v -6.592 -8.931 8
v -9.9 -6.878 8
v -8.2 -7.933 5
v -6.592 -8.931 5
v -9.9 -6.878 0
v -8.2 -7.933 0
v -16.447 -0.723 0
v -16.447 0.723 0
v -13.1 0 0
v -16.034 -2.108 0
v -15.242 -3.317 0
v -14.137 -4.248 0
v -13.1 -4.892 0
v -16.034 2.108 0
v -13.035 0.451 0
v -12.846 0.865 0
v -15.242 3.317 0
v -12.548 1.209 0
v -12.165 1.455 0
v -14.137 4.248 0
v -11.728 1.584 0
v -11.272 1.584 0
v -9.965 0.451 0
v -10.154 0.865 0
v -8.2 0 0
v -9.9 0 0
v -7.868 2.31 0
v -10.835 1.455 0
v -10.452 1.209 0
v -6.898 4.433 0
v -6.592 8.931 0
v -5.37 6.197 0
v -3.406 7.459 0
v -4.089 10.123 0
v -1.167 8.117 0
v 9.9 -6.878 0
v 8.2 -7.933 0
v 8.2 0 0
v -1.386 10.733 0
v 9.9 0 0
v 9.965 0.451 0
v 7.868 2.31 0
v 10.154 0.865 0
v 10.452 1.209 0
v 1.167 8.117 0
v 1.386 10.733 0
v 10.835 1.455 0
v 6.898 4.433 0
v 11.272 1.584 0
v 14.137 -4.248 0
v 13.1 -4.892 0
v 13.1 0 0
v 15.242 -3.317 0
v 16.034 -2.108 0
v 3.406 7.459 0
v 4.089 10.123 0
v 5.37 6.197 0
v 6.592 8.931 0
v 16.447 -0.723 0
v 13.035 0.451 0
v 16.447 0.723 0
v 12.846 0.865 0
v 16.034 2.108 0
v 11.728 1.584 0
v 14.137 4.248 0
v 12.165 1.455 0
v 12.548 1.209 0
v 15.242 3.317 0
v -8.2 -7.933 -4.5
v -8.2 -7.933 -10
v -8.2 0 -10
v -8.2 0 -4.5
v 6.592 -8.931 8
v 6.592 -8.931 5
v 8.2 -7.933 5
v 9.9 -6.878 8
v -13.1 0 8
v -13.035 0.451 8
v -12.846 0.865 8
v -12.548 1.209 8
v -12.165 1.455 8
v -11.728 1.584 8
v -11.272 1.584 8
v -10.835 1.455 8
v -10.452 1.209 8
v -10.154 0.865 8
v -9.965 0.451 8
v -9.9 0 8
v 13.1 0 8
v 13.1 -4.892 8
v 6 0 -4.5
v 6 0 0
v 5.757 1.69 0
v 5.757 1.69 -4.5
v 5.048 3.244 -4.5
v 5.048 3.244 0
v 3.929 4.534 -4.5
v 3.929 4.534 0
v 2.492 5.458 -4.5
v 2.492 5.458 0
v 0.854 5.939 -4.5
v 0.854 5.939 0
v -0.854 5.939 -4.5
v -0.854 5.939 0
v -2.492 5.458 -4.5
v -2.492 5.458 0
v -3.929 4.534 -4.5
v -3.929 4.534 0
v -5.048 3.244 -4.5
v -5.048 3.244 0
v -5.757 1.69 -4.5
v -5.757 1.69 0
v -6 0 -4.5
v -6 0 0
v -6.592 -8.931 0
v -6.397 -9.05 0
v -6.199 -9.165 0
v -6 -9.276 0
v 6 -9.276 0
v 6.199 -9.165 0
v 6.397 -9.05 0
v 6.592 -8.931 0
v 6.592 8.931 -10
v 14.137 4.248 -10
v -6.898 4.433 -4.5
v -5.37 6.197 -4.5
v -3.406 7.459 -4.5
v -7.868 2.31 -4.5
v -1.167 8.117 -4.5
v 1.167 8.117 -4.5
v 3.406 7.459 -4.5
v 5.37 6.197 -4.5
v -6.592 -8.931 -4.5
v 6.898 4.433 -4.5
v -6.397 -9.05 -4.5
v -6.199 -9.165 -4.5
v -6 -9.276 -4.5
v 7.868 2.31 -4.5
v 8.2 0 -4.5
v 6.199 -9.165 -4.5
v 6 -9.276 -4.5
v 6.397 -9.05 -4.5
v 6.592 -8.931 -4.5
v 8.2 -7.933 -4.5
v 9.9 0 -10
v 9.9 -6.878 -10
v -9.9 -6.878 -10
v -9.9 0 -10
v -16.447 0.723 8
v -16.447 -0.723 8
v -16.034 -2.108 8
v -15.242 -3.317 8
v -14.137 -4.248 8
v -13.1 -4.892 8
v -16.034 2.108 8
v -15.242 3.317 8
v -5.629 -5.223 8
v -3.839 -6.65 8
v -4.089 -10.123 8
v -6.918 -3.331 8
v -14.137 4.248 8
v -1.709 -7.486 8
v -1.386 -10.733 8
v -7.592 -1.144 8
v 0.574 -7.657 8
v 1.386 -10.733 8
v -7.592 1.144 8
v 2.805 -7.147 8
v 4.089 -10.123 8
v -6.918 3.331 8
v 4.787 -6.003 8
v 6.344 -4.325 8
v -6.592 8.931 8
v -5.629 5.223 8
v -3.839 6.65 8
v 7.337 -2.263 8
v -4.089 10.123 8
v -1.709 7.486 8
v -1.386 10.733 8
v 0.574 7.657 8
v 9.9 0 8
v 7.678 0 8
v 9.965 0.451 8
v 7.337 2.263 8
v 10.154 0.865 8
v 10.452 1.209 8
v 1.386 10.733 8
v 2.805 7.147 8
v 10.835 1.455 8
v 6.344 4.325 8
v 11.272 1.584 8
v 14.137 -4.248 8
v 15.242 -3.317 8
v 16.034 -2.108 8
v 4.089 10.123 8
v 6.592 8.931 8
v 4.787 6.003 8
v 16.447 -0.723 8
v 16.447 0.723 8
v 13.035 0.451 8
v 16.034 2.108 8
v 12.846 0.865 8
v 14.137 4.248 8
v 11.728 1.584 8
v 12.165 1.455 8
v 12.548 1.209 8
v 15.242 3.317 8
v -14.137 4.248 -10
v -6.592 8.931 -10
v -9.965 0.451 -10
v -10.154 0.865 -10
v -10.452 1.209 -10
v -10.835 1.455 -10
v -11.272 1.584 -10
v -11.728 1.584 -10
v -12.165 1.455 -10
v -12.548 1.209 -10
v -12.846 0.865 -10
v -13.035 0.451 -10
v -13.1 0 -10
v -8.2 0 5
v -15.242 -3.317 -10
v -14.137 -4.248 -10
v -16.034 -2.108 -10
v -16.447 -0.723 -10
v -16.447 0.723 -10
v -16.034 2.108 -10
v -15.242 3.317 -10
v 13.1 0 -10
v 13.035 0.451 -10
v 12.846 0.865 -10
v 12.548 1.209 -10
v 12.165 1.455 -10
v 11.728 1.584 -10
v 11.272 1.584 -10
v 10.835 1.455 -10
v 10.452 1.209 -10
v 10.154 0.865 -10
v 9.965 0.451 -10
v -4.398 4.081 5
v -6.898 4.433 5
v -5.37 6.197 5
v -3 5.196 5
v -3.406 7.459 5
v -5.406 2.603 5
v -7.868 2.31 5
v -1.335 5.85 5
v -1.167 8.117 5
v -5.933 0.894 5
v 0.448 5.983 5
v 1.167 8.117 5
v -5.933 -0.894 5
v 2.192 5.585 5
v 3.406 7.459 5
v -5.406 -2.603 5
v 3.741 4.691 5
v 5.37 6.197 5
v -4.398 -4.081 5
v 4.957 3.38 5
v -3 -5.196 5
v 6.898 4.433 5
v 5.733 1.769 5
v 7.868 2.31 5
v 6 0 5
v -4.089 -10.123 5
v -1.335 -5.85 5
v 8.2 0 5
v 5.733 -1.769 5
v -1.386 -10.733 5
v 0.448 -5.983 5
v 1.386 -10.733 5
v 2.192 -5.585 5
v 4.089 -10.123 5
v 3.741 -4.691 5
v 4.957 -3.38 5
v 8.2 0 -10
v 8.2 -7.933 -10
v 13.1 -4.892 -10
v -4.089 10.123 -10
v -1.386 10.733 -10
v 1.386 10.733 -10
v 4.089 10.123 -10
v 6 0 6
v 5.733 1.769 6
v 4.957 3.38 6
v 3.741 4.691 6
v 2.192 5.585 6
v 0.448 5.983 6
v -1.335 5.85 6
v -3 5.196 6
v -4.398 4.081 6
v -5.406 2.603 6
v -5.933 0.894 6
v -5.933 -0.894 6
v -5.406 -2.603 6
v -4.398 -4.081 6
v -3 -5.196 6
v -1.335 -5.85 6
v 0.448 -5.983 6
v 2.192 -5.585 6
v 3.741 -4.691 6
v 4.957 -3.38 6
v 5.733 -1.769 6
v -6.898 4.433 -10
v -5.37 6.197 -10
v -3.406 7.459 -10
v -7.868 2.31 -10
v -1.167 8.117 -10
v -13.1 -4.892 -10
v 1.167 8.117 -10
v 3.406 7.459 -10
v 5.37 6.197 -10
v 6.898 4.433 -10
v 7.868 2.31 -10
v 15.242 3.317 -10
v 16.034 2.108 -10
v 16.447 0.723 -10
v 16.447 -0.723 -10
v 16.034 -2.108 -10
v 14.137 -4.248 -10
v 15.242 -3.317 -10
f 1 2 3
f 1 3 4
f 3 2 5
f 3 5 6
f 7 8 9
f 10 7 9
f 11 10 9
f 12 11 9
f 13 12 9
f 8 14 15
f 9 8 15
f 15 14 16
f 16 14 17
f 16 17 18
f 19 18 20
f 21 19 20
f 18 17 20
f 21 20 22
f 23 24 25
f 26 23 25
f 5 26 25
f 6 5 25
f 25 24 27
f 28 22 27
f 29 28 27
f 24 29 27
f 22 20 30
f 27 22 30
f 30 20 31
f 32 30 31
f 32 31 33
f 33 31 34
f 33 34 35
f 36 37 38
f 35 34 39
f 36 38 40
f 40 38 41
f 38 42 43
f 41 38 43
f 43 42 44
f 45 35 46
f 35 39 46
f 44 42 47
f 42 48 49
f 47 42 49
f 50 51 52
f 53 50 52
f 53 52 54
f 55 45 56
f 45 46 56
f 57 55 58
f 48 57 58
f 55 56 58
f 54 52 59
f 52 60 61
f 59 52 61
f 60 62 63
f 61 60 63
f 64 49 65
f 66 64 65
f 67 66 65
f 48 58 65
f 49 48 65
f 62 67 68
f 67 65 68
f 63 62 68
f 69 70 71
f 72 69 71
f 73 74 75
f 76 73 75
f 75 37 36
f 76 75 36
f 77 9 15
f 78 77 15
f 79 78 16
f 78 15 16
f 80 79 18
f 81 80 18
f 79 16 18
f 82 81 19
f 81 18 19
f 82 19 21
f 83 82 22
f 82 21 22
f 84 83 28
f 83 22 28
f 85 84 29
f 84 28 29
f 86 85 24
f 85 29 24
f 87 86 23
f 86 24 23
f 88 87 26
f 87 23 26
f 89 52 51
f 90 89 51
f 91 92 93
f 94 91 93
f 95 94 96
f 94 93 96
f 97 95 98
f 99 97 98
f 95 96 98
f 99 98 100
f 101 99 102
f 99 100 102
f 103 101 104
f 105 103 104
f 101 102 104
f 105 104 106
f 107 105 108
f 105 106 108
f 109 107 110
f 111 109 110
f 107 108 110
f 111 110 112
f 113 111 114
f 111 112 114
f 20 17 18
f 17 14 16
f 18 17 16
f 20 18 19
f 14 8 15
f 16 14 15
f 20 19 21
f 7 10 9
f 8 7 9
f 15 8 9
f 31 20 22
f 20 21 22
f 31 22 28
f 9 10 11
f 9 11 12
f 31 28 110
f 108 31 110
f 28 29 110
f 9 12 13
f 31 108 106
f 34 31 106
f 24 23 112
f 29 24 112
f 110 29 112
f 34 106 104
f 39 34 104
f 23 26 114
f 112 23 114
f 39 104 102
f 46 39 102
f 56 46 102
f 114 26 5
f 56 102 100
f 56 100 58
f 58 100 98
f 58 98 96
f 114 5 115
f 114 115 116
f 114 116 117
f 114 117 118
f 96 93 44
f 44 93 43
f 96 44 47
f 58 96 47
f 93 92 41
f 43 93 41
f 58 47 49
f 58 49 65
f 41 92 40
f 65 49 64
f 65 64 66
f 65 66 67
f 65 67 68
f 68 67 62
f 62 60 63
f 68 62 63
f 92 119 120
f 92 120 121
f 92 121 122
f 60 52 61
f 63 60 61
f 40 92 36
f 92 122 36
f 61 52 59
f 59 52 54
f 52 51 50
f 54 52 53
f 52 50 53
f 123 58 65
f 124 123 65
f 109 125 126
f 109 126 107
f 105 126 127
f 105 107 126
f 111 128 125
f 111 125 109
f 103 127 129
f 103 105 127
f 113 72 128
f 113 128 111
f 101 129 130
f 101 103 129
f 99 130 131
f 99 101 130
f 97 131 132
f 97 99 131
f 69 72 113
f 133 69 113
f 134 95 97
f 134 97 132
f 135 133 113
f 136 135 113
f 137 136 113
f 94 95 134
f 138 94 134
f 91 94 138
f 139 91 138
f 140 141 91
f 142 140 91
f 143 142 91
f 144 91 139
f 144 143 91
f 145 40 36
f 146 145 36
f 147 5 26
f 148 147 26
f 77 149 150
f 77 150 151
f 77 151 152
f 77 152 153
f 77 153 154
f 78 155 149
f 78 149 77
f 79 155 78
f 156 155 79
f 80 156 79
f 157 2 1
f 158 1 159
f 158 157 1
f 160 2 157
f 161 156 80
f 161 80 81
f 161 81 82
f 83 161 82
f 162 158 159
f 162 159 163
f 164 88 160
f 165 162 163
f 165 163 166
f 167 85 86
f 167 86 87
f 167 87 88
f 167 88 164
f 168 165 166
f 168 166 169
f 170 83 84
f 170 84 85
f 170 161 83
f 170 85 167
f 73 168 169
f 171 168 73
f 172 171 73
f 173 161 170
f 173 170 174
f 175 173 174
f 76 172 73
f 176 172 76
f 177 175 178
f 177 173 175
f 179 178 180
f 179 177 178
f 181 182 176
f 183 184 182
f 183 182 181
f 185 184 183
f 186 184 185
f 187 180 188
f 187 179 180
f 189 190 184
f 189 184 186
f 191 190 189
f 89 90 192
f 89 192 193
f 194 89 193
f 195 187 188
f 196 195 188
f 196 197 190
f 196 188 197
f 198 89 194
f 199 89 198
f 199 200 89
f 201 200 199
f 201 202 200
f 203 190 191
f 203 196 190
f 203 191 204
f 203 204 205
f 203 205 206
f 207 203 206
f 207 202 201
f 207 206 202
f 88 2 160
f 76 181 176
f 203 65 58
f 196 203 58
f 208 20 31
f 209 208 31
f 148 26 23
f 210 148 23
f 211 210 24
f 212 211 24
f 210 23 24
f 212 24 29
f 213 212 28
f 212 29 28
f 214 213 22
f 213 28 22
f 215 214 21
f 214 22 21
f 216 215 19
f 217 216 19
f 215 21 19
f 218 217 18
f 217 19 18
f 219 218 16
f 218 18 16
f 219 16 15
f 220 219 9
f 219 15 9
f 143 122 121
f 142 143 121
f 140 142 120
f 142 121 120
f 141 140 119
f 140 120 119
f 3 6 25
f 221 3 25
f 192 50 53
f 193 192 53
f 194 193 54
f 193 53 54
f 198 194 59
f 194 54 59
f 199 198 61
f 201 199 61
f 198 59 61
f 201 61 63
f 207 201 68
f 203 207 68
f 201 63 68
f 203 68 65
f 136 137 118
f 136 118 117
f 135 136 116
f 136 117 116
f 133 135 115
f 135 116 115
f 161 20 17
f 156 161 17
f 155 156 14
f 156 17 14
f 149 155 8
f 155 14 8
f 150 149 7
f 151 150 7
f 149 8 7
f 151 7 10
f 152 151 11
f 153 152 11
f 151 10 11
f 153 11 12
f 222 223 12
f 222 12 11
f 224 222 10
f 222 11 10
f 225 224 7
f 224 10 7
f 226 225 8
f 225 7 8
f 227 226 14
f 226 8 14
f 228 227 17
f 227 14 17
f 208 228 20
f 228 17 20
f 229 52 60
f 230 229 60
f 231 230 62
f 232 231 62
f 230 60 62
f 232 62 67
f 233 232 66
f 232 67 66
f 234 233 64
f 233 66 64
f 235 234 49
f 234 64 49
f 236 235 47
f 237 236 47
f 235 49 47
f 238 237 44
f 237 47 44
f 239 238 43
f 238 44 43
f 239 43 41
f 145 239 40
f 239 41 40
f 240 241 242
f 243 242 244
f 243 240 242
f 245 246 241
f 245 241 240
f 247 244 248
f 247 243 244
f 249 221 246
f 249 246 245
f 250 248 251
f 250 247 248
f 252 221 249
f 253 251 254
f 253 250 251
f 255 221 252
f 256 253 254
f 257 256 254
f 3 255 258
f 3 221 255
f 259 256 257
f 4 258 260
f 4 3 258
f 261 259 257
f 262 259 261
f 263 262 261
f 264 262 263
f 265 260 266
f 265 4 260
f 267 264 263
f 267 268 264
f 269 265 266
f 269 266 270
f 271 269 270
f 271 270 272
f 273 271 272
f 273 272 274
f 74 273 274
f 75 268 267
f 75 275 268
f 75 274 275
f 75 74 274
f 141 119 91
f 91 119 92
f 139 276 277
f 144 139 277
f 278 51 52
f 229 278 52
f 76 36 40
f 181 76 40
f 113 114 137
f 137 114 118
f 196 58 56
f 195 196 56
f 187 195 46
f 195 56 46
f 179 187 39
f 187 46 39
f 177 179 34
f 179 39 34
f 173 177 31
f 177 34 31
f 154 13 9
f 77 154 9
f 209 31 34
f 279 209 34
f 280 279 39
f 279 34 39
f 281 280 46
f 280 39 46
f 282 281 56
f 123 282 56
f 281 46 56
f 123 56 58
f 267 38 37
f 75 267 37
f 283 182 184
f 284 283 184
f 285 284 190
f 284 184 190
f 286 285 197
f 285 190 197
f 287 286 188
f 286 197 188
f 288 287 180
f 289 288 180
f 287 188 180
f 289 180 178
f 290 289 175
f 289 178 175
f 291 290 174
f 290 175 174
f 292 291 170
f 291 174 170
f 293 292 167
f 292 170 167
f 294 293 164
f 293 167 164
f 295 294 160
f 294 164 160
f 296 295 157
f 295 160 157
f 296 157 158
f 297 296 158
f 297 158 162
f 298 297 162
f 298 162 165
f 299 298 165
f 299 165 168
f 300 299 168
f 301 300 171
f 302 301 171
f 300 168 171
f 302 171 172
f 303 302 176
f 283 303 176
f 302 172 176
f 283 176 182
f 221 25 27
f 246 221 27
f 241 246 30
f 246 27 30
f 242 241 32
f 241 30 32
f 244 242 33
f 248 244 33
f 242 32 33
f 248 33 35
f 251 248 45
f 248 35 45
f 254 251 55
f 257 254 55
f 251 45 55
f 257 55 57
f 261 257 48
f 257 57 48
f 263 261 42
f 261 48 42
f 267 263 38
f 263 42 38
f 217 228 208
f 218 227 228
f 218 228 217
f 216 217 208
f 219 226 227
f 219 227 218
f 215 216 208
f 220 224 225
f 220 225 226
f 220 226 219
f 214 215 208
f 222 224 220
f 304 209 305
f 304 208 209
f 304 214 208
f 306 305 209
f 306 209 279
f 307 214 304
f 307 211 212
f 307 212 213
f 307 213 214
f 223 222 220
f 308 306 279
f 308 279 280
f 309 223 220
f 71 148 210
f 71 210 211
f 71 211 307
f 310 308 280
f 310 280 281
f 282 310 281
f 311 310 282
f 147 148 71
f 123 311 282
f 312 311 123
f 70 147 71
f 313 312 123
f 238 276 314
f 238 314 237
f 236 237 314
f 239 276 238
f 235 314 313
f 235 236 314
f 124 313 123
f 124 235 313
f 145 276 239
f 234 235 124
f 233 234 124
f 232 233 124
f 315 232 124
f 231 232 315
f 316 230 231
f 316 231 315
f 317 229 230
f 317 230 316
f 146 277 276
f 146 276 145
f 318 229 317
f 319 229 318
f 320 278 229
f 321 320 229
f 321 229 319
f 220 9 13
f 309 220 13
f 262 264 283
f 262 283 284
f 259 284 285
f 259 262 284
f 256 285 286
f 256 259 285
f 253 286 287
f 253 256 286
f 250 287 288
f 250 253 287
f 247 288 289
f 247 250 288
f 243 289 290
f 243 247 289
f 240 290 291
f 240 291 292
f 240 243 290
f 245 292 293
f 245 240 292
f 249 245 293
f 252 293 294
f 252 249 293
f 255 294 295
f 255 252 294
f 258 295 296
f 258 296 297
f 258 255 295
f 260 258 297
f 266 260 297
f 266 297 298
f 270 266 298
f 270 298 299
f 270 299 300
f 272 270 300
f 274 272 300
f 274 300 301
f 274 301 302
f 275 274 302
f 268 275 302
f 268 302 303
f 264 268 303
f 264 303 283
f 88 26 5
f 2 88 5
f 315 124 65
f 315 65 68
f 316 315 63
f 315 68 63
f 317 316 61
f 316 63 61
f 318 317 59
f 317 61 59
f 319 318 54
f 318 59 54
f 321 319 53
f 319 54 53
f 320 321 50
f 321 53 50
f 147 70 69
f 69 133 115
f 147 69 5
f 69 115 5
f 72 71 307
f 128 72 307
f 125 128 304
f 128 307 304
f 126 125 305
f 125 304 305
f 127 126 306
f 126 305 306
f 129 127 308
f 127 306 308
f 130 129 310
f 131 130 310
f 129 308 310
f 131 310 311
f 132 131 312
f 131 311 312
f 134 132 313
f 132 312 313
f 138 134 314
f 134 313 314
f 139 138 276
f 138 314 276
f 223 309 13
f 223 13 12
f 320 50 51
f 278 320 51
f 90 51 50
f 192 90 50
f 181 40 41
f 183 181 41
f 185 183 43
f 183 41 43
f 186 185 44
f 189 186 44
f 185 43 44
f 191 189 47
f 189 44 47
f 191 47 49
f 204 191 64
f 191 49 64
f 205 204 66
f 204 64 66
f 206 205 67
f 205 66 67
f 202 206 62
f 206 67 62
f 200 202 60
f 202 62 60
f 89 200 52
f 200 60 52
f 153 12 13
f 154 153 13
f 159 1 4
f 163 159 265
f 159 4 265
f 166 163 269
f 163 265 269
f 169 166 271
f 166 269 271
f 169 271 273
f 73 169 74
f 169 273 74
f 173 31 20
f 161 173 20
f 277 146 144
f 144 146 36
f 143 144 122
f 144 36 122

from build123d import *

# Parameters (mm, degrees)
F1_R      = 6
F2_DEPTH  = 8
F4_DEPTH  = 5
F5_SIZE2  = 1.6781992624
F5_SIZE   = 2
F7_DEPTH  = 10
F9_DEPTH  = 10
F11_DEPTH = 5.5


with BuildPart() as f2:
    # F1 (on Top) → F2 (new body)
    with BuildSketch(Plane.XY):
        with BuildLine():
            Line((-6.5918714469, 8.9311071042), (-14.1367485788, 4.2482416283))
            ThreePointArc((-14.1367485788, 4.2482416283), (-16.5, 0), (-14.1367485788, -4.2482416283))
            Line((-14.1367485788, -4.2482416283), (-13.1, -4.8917185255))
            Line((-13.1, -4.8917185255), (-13.1, 0))
            ThreePointArc((-13.1, 0), (-11.5, 1.6), (-9.9, 0))
            Line((-9.9, 0), (-9.9, -6.8778568364))
            Line((-9.9, -6.8778568364), (-6.5918714469, -8.9311071042))
            ThreePointArc((-6.5918714469, -8.9311071042), (0, -10.8105030334), (6.5918714469, -8.9311071042))
            Line((6.5918714469, -8.9311071042), (9.9, -6.8778568364))
            Line((9.9, -6.8778568364), (9.9, 0))
            ThreePointArc((9.9, 0), (11.5, 1.6), (13.1, 0))
            Line((13.1, 0), (13.1, -4.8917185255))
            Line((13.1, -4.8917185255), (14.1367485788, -4.2482416283))
            ThreePointArc((14.1367485788, -4.2482416283), (16.5, 0), (14.1367485788, 4.2482416283))
            Line((14.1367485788, 4.2482416283), (6.5918714469, 8.9311071042))
            ThreePointArc((6.5918714469, 8.9311071042), (0, 10.8105030334), (-6.5918714469, 8.9311071042))
        make_face()
        Circle(F1_R, mode=Mode.SUBTRACT)
    extrude(amount=F2_DEPTH)

    # F3 (on face) → F4 (cut)
    with BuildSketch(Plane(origin=(0, 0, 0), x_dir=(1, 0, 0), z_dir=(0, 0, -1))):
        with BuildLine():
            Line((-8.2, 12.4587612227), (-8.2, 7.9329928141))
            Line((-8.2, 7.9329928141), (-8.2, 0))
            ThreePointArc((-8.2, 0), (0, -8.2), (8.2, 0))
            Line((8.2, 0), (8.2, 7.9329928141))
            Line((8.2, 7.9329928141), (8.2, 12.4587612227))
            Line((8.2, 12.4587612227), (-8.2, 12.4587612227))
        make_face()
    extrude(amount=-F4_DEPTH, mode=Mode.SUBTRACT)

    # F5
    f5_edges = [f2.edges().sort_by_distance(p)[0] for p in [
        (-6, 0, 8),
    ]]
    f5_side = f2.faces().sort_by_distance((-6, 0, 6.5))[0]
    chamfer(f5_edges, length=F5_SIZE, length2=F5_SIZE2, reference=f5_side)


with BuildPart() as f7:
    # F6 (on face) → F7 (new body)
    with BuildSketch(Plane(origin=(0, 0, 0), x_dir=(1, 0, 0), z_dir=(0, 0, -1))):
        with BuildLine():
            ThreePointArc((6.5918714469, 8.9311071042), (0, 10.8105030334), (-6.5918714469, 8.9311071042))
            Line((-6.5918714469, 8.9311071042), (-9.9, 6.8778568364))
            Line((-9.9, 6.8778568364), (-9.9, 0))
            ThreePointArc((-9.9, 0), (-11.5, -1.6), (-13.1, 0))
            Line((-13.1, 0), (-13.1, 4.8917185255))
            Line((-13.1, 4.8917185255), (-14.1367485788, 4.2482416283))
            ThreePointArc((-14.1367485788, 4.2482416283), (-16.5, 0), (-14.1367485788, -4.2482416283))
            Line((-14.1367485788, -4.2482416283), (-6.5918714469, -8.9311071042))
            ThreePointArc((-6.5918714469, -8.9311071042), (0, -10.8105030334), (6.5918714469, -8.9311071042))
            Line((6.5918714469, -8.9311071042), (14.1367485788, -4.2482416283))
            ThreePointArc((14.1367485788, -4.2482416283), (16.5, 0), (14.1367485788, 4.2482416283))
            Line((14.1367485788, 4.2482416283), (13.1, 4.8917185255))
            Line((13.1, 4.8917185255), (13.1, 0))
            ThreePointArc((13.1, 0), (11.5, -1.6), (9.9, 0))
            Line((9.9, 0), (9.9, 6.8778568364))
            Line((9.9, 6.8778568364), (6.5918714469, 8.9311071042))
        make_face()
    extrude(amount=F7_DEPTH)

    # F8 (on face) → F9 (cut, through all)
    with BuildSketch(Plane.XY):
        with BuildLine():
            Line((6, -13.5215136041), (6, 0))
            ThreePointArc((6, 0), (0, 6), (-6, 0))
            Line((-6, 0), (-6, -13.5215136041))
            Line((-6, -13.5215136041), (6, -13.5215136041))
        make_face()
    extrude(amount=-F9_DEPTH, mode=Mode.SUBTRACT)

    # F10 (on face) → F11 (cut)
    with BuildSketch(Plane(origin=(0, 0, -10), x_dir=(1, 0, 0), z_dir=(0, 0, -1))):
        with BuildLine():
            Line((-8.2, 14.8318540305), (-8.2, 7.9329928141))
            Line((-8.2, 7.9329928141), (-8.2, 0))
            ThreePointArc((-8.2, 0), (0, -8.2), (8.2, 0))
            Line((8.2, 0), (8.2, 7.9329928141))
            Line((8.2, 7.9329928141), (8.2, 14.8318540305))
            Line((8.2, 14.8318540305), (-8.2, 14.8318540305))
        make_face()
    extrude(amount=-F11_DEPTH, mode=Mode.SUBTRACT)


solid = Compound([f2.part, f7.part])
